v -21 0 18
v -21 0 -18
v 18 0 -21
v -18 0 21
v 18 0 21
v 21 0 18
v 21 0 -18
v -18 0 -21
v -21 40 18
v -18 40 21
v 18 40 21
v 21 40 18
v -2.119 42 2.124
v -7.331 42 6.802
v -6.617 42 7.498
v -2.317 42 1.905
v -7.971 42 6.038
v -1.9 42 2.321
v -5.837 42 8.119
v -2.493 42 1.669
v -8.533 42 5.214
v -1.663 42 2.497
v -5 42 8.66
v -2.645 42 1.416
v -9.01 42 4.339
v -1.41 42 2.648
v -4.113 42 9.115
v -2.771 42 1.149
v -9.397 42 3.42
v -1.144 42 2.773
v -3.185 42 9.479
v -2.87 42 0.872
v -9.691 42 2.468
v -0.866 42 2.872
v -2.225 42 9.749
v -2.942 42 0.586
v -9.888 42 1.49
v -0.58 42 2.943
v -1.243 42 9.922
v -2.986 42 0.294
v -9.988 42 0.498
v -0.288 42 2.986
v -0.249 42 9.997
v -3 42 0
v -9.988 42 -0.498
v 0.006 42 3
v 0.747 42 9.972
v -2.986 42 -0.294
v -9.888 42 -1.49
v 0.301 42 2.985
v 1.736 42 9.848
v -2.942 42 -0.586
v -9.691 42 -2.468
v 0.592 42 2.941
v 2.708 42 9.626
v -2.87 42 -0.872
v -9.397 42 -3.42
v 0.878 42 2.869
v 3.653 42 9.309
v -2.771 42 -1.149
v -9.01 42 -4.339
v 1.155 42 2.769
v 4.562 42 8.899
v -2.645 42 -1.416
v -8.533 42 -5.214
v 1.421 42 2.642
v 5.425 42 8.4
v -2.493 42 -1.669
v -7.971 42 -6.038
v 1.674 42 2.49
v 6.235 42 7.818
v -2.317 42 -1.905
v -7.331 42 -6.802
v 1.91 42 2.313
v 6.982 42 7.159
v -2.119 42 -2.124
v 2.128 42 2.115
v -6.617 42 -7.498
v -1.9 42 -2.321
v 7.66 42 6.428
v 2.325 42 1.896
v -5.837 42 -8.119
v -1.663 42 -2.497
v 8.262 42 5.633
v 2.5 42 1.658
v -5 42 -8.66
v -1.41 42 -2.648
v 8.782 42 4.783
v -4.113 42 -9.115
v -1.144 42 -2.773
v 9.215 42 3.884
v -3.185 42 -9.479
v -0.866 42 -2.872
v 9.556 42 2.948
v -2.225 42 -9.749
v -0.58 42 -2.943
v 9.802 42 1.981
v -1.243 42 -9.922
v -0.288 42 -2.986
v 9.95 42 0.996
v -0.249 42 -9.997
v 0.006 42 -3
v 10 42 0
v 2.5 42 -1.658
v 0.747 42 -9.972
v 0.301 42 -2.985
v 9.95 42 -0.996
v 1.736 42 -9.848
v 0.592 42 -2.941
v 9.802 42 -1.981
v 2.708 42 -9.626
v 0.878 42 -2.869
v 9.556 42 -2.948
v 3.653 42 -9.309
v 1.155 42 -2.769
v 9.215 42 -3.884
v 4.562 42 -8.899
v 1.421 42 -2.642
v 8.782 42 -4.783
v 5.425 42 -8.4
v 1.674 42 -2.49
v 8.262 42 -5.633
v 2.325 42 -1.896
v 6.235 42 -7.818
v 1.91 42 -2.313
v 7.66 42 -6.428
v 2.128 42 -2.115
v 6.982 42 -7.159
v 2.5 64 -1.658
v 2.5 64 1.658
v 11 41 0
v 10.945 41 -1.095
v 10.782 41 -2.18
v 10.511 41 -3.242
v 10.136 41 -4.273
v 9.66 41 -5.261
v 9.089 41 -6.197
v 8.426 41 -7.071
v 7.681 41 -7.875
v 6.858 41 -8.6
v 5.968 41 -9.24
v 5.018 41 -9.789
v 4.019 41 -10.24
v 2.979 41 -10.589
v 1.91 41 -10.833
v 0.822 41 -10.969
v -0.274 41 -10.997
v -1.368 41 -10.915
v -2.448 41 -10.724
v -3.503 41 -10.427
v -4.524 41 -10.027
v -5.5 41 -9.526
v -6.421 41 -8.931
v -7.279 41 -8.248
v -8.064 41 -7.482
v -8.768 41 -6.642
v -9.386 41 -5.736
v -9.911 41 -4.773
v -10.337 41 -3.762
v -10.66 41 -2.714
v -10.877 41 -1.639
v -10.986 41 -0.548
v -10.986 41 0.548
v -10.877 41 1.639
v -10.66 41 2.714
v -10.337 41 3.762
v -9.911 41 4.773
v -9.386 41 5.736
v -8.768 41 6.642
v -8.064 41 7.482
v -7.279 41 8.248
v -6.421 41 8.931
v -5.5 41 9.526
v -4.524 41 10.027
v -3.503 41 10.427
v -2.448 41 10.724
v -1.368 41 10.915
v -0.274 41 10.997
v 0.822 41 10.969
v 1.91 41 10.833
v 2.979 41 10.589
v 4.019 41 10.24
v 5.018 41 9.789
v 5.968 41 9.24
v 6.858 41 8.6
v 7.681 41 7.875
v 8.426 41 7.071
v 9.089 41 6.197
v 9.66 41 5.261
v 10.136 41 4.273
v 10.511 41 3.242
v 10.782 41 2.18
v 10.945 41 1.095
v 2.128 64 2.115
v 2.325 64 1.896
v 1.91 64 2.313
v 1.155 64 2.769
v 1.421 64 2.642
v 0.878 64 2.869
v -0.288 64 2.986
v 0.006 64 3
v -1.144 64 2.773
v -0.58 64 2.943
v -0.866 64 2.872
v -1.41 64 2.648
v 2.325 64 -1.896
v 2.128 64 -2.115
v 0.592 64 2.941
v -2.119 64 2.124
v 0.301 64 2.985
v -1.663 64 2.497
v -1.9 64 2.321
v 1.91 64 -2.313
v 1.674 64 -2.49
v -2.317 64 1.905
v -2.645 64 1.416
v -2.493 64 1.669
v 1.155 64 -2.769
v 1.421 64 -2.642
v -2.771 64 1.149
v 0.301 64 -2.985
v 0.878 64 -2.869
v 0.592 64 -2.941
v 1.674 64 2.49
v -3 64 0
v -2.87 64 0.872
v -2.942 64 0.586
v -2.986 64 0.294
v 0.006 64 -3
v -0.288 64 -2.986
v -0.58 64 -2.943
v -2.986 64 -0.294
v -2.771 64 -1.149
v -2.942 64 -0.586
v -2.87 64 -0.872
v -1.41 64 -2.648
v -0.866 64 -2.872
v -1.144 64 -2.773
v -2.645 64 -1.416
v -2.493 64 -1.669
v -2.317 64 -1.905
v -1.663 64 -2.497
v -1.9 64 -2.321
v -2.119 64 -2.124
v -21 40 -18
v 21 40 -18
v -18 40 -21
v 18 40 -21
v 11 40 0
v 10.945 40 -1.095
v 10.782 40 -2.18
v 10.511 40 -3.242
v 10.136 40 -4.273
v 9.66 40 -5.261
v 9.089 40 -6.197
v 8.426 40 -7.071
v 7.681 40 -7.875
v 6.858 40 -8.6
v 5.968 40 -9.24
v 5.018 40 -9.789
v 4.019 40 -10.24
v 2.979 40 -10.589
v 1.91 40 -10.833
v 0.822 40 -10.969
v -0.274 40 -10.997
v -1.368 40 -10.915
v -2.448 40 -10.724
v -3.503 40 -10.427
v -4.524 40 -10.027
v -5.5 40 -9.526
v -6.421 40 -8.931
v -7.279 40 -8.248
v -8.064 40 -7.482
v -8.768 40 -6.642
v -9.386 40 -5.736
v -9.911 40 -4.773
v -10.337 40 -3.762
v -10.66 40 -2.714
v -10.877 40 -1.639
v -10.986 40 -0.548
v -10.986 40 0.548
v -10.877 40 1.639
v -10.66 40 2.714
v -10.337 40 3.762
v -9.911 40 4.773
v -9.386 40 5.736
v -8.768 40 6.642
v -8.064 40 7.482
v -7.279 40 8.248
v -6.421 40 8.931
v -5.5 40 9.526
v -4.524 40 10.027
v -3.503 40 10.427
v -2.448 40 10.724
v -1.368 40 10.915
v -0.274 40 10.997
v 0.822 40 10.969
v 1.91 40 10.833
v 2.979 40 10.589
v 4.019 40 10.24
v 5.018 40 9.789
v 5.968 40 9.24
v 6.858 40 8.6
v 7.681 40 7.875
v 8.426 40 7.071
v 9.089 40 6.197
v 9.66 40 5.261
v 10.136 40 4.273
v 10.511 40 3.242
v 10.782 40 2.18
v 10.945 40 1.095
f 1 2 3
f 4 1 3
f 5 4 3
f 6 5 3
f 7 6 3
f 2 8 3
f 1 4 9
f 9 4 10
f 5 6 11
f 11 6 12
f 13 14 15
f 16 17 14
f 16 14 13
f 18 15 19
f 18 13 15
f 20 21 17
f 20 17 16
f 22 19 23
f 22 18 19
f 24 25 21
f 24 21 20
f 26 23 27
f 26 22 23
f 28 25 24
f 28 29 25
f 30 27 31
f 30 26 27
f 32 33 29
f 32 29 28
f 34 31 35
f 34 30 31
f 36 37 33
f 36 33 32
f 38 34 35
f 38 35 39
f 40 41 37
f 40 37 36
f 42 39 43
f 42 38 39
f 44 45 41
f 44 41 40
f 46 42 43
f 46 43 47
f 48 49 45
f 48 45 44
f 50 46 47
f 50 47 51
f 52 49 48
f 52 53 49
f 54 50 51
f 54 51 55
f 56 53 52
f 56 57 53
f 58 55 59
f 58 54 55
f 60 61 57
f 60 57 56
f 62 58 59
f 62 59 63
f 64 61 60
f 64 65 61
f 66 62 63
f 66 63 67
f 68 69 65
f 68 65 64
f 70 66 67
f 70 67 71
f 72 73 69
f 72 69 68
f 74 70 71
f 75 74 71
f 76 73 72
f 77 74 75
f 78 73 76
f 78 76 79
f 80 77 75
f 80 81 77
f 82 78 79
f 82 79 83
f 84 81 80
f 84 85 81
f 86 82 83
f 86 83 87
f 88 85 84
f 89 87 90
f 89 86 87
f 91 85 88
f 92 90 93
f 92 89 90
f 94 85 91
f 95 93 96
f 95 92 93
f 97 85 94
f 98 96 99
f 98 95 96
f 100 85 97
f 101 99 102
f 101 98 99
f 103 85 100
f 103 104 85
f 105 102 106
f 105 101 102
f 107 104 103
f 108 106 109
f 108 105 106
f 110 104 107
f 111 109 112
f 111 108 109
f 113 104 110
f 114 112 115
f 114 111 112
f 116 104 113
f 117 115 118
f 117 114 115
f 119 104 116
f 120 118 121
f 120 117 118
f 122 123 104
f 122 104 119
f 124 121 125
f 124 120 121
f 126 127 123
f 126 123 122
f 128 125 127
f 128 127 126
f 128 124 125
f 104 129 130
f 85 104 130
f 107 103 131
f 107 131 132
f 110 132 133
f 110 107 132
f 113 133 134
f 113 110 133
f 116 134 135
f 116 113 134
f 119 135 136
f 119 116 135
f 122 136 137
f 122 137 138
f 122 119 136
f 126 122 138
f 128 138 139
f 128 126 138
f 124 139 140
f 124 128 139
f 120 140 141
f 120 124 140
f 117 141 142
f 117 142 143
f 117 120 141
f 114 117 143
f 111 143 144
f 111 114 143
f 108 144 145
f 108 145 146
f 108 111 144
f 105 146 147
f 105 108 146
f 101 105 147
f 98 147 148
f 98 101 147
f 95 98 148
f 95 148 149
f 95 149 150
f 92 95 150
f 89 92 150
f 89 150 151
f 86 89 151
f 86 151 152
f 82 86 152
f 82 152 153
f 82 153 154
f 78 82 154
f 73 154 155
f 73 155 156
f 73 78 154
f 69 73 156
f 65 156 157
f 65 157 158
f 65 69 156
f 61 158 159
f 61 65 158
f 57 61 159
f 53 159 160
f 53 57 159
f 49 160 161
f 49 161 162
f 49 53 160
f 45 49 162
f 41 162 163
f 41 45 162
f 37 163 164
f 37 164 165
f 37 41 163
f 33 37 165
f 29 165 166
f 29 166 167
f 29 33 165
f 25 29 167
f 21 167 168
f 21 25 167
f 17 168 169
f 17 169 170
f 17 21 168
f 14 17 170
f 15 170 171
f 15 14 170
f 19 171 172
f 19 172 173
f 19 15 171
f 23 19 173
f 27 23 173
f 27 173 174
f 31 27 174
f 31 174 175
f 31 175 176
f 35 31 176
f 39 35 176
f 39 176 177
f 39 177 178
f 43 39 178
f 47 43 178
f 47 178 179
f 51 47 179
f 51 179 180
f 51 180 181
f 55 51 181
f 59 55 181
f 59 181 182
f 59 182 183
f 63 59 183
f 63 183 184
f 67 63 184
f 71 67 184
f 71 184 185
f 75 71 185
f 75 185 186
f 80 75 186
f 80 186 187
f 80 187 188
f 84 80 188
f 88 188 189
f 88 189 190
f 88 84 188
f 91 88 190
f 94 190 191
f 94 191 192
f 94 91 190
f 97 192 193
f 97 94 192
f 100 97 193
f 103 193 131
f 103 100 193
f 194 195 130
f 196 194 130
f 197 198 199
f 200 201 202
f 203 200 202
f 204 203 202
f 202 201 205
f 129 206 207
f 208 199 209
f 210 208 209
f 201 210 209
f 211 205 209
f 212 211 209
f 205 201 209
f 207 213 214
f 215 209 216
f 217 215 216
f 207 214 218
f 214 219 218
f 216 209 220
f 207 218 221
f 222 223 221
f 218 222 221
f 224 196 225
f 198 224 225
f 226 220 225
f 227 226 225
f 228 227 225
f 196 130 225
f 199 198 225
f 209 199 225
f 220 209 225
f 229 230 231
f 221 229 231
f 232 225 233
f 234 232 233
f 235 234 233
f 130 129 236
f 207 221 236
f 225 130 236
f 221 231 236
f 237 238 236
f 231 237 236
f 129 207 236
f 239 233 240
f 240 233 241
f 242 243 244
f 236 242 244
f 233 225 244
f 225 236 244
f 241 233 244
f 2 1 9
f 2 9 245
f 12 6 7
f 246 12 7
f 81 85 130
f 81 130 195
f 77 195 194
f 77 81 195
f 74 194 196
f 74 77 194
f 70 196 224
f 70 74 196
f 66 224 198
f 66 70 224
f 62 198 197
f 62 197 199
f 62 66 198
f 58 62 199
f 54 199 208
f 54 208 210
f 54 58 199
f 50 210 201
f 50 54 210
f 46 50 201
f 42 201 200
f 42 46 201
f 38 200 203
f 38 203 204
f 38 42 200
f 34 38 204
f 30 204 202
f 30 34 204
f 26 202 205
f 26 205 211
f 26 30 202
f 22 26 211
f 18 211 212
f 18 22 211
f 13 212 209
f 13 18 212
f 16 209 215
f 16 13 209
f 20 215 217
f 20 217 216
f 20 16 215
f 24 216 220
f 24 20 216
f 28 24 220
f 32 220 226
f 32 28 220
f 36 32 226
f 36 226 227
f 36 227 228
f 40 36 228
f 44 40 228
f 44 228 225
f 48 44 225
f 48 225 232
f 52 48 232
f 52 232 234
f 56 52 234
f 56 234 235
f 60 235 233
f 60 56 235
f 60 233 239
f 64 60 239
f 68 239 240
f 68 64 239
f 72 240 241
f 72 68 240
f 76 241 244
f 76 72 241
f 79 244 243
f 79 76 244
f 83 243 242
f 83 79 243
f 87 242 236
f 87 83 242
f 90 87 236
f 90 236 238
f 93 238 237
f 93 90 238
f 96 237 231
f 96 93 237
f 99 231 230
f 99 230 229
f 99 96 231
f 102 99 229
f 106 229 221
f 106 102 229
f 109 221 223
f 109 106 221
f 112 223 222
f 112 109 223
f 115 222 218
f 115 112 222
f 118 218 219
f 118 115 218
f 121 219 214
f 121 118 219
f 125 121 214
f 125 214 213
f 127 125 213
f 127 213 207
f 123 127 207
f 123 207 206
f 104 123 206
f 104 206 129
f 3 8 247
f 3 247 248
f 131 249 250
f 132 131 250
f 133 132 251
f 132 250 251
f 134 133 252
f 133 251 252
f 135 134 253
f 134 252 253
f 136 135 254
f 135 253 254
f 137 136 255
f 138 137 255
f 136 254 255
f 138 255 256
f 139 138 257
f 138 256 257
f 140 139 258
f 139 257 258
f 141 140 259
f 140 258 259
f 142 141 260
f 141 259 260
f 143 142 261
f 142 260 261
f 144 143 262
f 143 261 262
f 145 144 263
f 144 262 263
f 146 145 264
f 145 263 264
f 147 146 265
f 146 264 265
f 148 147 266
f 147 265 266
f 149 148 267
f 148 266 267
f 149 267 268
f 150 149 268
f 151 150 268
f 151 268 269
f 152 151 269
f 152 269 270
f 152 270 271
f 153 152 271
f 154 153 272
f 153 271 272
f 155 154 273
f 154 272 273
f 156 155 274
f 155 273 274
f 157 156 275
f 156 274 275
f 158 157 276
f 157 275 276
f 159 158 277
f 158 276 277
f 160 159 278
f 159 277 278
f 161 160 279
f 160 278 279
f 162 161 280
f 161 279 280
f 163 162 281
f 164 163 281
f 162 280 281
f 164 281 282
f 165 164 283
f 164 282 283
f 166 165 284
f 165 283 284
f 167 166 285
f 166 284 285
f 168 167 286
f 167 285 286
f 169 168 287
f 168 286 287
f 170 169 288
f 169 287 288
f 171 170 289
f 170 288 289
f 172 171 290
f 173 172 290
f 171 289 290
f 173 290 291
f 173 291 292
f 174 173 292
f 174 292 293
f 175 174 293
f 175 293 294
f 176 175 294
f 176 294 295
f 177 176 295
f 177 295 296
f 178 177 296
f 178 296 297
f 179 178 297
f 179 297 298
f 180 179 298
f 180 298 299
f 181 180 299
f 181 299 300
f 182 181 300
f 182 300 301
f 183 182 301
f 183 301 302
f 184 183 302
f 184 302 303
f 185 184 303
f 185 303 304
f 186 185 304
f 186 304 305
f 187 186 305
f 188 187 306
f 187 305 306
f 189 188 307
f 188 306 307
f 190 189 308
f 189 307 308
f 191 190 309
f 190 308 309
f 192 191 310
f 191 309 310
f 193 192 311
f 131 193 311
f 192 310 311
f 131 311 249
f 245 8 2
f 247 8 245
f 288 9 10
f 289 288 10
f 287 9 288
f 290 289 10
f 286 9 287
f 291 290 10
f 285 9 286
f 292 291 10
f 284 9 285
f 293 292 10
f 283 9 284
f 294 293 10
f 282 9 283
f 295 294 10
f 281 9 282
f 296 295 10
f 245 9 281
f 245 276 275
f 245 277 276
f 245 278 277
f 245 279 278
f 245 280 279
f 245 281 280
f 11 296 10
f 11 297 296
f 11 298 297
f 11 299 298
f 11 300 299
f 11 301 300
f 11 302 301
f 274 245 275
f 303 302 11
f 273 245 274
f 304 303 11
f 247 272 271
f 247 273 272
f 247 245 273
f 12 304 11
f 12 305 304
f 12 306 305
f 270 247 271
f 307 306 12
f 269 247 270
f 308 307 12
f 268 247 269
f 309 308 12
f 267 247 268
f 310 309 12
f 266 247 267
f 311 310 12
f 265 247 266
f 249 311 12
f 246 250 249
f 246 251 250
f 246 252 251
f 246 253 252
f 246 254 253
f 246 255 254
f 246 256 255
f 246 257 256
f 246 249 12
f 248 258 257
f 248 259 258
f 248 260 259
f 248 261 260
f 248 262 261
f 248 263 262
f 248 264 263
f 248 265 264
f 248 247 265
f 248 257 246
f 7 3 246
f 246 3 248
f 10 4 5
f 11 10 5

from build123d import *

# Parameters (mm, degrees)
SKETCH1_W           = 42
SKETCH1_H           = 42
BOSS_EXTRUDE1_DEPTH = 40
CHAMFER2_SIZE       = 3
SKETCH2_R           = 11
BOSS_EXTRUDE2_DEPTH = 2
BOSS_EXTRUDE3_DEPTH = 22
CHAMFER3_SIZE       = 1


with BuildPart() as part:
    # Sketch1 → Boss-Extrude1 (new body)
    with BuildSketch(Plane(origin=(0, 0, 0), x_dir=(1, 0, 0), z_dir=(0, 1, 0))):
        Rectangle(SKETCH1_W, SKETCH1_H)
    extrude(amount=BOSS_EXTRUDE1_DEPTH)

    # Chamfer2
    chamfer2_edges = [part.edges().sort_by_distance(p)[0] for p in [
        (21, 20, 21),
        (-21, 20, 21),
        (-21, 20, -21),
        (21, 20, -21),
    ]]
    chamfer(chamfer2_edges, length=CHAMFER2_SIZE)

    # Sketch2 → Boss-Extrude2 (add)
    with BuildSketch(Plane(origin=(0, 40, 0), x_dir=(1, 0, 0), z_dir=(0, 1, 0))):
        Circle(SKETCH2_R)
    extrude(amount=BOSS_EXTRUDE2_DEPTH)

    # Sketch3 → Boss-Extrude3 (add)
    with BuildSketch(Plane(origin=(0, 42, 0), x_dir=(1, 0, 0), z_dir=(0, 1, 0))):
        with BuildLine():
            Line((2.5, 1.658312395), (2.5, -1.658312395))
            ThreePointArc((2.5, -1.658312395), (-3, 0), (2.5, 1.658312395))
        make_face()
    extrude(amount=BOSS_EXTRUDE3_DEPTH)

    # Chamfer3
    chamfer3_edges = [part.edges().sort_by_distance(p)[0] for p in [
        (-11, 42, 0),
    ]]
    chamfer(chamfer3_edges, length=CHAMFER3_SIZE)


solid = part.part
